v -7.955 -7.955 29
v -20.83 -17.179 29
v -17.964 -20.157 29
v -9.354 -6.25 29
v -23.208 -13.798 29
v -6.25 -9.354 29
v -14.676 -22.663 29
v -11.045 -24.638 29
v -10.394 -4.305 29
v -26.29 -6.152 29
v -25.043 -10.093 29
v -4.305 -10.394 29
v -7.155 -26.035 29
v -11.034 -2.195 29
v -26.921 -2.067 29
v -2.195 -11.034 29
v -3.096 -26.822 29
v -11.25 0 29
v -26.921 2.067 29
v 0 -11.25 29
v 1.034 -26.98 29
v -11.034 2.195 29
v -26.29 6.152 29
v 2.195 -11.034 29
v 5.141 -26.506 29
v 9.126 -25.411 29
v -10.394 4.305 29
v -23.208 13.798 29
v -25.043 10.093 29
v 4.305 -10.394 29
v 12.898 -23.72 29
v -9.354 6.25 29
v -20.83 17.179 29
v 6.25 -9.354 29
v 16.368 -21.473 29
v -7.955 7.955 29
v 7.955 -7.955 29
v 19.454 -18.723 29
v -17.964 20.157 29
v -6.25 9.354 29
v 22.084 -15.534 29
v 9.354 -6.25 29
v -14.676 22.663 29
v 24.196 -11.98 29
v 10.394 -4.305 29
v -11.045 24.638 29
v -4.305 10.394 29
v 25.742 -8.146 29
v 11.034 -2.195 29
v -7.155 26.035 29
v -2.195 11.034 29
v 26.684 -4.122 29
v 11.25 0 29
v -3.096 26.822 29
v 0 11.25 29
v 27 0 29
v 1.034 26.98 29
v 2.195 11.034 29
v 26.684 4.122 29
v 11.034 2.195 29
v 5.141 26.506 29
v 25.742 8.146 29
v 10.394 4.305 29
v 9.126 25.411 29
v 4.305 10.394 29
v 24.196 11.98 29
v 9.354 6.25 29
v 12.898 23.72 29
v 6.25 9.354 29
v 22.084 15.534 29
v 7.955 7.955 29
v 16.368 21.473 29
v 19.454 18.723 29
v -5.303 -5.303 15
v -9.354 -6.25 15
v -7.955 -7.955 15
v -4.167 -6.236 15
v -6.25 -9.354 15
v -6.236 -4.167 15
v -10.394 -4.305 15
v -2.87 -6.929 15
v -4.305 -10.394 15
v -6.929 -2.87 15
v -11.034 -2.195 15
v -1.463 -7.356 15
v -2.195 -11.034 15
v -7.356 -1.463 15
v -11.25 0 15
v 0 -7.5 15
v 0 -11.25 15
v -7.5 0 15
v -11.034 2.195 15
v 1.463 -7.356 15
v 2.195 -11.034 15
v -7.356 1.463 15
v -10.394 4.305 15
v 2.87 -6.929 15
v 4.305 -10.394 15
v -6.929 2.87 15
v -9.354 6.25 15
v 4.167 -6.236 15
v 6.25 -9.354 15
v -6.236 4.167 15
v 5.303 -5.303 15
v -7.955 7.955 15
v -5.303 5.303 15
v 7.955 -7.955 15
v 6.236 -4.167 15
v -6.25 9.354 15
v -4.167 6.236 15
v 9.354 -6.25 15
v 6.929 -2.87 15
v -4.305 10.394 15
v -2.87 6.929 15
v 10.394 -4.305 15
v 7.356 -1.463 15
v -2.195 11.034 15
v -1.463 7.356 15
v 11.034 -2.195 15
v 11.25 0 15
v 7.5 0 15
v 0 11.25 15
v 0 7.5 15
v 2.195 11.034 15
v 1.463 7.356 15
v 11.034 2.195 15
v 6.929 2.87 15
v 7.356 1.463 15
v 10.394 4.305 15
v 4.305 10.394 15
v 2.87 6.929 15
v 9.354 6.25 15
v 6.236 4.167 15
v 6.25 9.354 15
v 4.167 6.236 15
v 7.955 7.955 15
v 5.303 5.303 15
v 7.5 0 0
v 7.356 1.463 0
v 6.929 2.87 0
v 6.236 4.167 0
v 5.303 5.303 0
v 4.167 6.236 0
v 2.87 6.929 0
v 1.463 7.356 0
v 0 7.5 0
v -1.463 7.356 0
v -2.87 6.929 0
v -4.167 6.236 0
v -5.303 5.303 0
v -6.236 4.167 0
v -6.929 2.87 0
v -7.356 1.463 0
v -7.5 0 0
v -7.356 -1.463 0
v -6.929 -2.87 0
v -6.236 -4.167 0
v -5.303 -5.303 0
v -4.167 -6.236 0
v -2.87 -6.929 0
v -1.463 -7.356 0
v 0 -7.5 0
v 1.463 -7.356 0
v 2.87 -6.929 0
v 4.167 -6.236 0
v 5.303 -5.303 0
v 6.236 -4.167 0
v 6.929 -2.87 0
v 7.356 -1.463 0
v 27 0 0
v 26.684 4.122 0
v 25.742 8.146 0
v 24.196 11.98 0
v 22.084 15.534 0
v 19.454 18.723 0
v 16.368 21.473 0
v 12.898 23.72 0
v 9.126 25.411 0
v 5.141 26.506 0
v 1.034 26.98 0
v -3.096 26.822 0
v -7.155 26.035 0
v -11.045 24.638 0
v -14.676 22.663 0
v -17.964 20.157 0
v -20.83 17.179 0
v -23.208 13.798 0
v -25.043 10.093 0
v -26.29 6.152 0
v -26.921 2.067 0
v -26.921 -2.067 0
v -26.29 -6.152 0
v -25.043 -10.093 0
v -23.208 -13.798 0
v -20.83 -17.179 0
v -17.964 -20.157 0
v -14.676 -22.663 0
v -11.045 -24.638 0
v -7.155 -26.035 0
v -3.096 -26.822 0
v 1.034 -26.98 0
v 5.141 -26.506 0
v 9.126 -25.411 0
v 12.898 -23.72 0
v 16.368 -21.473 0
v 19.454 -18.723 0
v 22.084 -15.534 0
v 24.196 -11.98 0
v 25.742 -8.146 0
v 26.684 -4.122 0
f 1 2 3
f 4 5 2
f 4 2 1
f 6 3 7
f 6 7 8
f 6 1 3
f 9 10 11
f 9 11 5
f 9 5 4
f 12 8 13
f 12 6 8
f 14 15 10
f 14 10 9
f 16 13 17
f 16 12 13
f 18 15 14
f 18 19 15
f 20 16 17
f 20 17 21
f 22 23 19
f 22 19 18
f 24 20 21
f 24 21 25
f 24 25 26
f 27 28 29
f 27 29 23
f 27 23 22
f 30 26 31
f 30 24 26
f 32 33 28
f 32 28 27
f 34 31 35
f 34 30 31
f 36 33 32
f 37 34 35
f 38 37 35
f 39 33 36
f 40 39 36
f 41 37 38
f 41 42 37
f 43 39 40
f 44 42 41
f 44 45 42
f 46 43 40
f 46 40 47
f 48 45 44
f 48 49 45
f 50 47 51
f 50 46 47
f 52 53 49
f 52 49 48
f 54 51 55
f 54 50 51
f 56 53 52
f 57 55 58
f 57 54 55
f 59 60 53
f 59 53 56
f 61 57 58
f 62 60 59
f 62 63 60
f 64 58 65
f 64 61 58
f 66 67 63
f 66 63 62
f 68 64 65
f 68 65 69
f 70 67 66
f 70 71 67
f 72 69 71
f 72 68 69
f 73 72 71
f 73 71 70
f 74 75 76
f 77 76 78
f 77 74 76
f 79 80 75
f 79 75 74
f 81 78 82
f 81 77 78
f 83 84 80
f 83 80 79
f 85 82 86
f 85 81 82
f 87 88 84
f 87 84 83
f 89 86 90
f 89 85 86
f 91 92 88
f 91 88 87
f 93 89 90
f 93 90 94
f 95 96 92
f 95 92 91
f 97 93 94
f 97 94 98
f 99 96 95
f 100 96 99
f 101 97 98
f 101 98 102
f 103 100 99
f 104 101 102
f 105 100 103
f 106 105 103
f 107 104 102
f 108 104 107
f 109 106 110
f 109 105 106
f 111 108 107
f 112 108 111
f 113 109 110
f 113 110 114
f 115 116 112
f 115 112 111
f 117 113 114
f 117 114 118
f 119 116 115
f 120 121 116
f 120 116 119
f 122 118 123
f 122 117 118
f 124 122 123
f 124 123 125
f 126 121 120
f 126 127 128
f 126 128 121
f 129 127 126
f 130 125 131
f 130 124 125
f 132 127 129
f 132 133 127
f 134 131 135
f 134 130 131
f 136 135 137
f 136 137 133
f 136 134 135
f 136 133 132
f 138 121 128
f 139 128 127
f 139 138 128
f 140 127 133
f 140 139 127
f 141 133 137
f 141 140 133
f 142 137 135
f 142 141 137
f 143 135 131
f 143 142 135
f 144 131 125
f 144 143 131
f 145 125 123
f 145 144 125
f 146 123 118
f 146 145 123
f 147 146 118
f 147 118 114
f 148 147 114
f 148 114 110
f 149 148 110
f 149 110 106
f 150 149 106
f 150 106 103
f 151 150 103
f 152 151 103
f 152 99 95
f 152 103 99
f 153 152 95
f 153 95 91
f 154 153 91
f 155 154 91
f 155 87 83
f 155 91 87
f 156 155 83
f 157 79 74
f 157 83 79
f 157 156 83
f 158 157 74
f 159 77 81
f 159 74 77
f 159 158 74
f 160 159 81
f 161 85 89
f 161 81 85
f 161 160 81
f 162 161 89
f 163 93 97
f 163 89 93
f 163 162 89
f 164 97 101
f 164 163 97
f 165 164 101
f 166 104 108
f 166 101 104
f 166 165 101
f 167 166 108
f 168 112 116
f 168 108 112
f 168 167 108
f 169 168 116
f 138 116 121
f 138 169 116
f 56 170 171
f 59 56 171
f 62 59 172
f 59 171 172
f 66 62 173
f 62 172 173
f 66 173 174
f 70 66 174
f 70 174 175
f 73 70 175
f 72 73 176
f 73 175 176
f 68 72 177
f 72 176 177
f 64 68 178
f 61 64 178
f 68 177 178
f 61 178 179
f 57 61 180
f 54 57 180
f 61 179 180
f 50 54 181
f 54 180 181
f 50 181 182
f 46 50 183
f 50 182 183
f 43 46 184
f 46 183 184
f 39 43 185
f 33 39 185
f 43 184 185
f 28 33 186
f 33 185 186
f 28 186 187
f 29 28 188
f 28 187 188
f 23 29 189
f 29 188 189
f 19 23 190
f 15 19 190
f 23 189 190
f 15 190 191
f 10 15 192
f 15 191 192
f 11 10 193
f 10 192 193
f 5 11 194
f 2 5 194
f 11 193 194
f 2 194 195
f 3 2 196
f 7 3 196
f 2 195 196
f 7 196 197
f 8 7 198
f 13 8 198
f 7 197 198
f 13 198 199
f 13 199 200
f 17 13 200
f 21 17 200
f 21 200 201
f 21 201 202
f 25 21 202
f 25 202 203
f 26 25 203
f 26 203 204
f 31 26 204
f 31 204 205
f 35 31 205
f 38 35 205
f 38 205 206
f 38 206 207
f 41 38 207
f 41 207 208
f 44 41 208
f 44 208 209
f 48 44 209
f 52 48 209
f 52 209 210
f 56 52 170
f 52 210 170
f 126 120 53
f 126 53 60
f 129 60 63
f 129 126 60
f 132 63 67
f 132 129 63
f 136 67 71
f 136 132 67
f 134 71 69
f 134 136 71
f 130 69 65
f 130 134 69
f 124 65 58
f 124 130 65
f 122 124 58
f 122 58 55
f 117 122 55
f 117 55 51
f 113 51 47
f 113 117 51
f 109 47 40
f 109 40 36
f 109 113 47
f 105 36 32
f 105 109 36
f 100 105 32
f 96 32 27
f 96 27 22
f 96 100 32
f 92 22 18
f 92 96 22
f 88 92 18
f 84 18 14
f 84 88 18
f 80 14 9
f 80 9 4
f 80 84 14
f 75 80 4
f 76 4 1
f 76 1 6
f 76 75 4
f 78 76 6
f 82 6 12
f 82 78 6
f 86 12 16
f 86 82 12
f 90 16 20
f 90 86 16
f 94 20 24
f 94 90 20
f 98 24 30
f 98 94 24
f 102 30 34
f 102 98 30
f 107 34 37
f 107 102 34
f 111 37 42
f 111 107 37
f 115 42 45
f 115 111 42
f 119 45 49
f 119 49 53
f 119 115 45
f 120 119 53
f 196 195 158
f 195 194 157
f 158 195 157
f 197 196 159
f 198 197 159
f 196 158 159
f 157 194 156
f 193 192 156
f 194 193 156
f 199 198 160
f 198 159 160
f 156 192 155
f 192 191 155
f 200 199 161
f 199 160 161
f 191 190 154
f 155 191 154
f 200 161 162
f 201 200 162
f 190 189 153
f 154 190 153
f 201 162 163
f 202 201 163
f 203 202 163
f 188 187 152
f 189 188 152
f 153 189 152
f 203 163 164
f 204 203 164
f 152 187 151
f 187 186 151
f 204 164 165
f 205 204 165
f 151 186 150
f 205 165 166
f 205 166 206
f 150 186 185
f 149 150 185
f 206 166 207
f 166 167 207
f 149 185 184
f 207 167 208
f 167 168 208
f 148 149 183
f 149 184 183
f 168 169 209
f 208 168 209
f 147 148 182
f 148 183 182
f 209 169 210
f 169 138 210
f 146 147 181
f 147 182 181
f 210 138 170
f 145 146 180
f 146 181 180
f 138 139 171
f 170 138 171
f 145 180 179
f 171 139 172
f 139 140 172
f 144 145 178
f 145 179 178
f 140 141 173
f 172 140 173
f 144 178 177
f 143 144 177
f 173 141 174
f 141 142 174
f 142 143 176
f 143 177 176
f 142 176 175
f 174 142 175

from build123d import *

# Parameters (mm, degrees)
CYLINDER002_R     = 11.25
CYLINDER002_DEPTH = 14
CYLINDER001_R     = 7.5
CYLINDER001_DEPTH = 29
CYLINDER_R        = 27
CYLINDER_DEPTH    = 29


with BuildPart() as cylinder002:
    # Cylinder002 → Cylinder002 (new body)
    with BuildSketch(Plane.XY.offset(15)):
        Circle(CYLINDER002_R)
    extrude(amount=CYLINDER002_DEPTH)


with BuildPart() as fusion:
    # Cylinder001 → Cylinder001 (new body)
    with BuildSketch(Plane.XY):
        Circle(CYLINDER001_R)
    extrude(amount=CYLINDER001_DEPTH)

    # Fusion: union Cylinder002
    add(cylinder002.part)


with BuildPart() as singleadapter:
    # Cylinder → Cylinder (new body)
    with BuildSketch(Plane.XY):
        Circle(CYLINDER_R)
    extrude(amount=CYLINDER_DEPTH)

    # Cut: cut Fusion
    add(fusion.part, mode=Mode.SUBTRACT)


solid = singleadapter.part
